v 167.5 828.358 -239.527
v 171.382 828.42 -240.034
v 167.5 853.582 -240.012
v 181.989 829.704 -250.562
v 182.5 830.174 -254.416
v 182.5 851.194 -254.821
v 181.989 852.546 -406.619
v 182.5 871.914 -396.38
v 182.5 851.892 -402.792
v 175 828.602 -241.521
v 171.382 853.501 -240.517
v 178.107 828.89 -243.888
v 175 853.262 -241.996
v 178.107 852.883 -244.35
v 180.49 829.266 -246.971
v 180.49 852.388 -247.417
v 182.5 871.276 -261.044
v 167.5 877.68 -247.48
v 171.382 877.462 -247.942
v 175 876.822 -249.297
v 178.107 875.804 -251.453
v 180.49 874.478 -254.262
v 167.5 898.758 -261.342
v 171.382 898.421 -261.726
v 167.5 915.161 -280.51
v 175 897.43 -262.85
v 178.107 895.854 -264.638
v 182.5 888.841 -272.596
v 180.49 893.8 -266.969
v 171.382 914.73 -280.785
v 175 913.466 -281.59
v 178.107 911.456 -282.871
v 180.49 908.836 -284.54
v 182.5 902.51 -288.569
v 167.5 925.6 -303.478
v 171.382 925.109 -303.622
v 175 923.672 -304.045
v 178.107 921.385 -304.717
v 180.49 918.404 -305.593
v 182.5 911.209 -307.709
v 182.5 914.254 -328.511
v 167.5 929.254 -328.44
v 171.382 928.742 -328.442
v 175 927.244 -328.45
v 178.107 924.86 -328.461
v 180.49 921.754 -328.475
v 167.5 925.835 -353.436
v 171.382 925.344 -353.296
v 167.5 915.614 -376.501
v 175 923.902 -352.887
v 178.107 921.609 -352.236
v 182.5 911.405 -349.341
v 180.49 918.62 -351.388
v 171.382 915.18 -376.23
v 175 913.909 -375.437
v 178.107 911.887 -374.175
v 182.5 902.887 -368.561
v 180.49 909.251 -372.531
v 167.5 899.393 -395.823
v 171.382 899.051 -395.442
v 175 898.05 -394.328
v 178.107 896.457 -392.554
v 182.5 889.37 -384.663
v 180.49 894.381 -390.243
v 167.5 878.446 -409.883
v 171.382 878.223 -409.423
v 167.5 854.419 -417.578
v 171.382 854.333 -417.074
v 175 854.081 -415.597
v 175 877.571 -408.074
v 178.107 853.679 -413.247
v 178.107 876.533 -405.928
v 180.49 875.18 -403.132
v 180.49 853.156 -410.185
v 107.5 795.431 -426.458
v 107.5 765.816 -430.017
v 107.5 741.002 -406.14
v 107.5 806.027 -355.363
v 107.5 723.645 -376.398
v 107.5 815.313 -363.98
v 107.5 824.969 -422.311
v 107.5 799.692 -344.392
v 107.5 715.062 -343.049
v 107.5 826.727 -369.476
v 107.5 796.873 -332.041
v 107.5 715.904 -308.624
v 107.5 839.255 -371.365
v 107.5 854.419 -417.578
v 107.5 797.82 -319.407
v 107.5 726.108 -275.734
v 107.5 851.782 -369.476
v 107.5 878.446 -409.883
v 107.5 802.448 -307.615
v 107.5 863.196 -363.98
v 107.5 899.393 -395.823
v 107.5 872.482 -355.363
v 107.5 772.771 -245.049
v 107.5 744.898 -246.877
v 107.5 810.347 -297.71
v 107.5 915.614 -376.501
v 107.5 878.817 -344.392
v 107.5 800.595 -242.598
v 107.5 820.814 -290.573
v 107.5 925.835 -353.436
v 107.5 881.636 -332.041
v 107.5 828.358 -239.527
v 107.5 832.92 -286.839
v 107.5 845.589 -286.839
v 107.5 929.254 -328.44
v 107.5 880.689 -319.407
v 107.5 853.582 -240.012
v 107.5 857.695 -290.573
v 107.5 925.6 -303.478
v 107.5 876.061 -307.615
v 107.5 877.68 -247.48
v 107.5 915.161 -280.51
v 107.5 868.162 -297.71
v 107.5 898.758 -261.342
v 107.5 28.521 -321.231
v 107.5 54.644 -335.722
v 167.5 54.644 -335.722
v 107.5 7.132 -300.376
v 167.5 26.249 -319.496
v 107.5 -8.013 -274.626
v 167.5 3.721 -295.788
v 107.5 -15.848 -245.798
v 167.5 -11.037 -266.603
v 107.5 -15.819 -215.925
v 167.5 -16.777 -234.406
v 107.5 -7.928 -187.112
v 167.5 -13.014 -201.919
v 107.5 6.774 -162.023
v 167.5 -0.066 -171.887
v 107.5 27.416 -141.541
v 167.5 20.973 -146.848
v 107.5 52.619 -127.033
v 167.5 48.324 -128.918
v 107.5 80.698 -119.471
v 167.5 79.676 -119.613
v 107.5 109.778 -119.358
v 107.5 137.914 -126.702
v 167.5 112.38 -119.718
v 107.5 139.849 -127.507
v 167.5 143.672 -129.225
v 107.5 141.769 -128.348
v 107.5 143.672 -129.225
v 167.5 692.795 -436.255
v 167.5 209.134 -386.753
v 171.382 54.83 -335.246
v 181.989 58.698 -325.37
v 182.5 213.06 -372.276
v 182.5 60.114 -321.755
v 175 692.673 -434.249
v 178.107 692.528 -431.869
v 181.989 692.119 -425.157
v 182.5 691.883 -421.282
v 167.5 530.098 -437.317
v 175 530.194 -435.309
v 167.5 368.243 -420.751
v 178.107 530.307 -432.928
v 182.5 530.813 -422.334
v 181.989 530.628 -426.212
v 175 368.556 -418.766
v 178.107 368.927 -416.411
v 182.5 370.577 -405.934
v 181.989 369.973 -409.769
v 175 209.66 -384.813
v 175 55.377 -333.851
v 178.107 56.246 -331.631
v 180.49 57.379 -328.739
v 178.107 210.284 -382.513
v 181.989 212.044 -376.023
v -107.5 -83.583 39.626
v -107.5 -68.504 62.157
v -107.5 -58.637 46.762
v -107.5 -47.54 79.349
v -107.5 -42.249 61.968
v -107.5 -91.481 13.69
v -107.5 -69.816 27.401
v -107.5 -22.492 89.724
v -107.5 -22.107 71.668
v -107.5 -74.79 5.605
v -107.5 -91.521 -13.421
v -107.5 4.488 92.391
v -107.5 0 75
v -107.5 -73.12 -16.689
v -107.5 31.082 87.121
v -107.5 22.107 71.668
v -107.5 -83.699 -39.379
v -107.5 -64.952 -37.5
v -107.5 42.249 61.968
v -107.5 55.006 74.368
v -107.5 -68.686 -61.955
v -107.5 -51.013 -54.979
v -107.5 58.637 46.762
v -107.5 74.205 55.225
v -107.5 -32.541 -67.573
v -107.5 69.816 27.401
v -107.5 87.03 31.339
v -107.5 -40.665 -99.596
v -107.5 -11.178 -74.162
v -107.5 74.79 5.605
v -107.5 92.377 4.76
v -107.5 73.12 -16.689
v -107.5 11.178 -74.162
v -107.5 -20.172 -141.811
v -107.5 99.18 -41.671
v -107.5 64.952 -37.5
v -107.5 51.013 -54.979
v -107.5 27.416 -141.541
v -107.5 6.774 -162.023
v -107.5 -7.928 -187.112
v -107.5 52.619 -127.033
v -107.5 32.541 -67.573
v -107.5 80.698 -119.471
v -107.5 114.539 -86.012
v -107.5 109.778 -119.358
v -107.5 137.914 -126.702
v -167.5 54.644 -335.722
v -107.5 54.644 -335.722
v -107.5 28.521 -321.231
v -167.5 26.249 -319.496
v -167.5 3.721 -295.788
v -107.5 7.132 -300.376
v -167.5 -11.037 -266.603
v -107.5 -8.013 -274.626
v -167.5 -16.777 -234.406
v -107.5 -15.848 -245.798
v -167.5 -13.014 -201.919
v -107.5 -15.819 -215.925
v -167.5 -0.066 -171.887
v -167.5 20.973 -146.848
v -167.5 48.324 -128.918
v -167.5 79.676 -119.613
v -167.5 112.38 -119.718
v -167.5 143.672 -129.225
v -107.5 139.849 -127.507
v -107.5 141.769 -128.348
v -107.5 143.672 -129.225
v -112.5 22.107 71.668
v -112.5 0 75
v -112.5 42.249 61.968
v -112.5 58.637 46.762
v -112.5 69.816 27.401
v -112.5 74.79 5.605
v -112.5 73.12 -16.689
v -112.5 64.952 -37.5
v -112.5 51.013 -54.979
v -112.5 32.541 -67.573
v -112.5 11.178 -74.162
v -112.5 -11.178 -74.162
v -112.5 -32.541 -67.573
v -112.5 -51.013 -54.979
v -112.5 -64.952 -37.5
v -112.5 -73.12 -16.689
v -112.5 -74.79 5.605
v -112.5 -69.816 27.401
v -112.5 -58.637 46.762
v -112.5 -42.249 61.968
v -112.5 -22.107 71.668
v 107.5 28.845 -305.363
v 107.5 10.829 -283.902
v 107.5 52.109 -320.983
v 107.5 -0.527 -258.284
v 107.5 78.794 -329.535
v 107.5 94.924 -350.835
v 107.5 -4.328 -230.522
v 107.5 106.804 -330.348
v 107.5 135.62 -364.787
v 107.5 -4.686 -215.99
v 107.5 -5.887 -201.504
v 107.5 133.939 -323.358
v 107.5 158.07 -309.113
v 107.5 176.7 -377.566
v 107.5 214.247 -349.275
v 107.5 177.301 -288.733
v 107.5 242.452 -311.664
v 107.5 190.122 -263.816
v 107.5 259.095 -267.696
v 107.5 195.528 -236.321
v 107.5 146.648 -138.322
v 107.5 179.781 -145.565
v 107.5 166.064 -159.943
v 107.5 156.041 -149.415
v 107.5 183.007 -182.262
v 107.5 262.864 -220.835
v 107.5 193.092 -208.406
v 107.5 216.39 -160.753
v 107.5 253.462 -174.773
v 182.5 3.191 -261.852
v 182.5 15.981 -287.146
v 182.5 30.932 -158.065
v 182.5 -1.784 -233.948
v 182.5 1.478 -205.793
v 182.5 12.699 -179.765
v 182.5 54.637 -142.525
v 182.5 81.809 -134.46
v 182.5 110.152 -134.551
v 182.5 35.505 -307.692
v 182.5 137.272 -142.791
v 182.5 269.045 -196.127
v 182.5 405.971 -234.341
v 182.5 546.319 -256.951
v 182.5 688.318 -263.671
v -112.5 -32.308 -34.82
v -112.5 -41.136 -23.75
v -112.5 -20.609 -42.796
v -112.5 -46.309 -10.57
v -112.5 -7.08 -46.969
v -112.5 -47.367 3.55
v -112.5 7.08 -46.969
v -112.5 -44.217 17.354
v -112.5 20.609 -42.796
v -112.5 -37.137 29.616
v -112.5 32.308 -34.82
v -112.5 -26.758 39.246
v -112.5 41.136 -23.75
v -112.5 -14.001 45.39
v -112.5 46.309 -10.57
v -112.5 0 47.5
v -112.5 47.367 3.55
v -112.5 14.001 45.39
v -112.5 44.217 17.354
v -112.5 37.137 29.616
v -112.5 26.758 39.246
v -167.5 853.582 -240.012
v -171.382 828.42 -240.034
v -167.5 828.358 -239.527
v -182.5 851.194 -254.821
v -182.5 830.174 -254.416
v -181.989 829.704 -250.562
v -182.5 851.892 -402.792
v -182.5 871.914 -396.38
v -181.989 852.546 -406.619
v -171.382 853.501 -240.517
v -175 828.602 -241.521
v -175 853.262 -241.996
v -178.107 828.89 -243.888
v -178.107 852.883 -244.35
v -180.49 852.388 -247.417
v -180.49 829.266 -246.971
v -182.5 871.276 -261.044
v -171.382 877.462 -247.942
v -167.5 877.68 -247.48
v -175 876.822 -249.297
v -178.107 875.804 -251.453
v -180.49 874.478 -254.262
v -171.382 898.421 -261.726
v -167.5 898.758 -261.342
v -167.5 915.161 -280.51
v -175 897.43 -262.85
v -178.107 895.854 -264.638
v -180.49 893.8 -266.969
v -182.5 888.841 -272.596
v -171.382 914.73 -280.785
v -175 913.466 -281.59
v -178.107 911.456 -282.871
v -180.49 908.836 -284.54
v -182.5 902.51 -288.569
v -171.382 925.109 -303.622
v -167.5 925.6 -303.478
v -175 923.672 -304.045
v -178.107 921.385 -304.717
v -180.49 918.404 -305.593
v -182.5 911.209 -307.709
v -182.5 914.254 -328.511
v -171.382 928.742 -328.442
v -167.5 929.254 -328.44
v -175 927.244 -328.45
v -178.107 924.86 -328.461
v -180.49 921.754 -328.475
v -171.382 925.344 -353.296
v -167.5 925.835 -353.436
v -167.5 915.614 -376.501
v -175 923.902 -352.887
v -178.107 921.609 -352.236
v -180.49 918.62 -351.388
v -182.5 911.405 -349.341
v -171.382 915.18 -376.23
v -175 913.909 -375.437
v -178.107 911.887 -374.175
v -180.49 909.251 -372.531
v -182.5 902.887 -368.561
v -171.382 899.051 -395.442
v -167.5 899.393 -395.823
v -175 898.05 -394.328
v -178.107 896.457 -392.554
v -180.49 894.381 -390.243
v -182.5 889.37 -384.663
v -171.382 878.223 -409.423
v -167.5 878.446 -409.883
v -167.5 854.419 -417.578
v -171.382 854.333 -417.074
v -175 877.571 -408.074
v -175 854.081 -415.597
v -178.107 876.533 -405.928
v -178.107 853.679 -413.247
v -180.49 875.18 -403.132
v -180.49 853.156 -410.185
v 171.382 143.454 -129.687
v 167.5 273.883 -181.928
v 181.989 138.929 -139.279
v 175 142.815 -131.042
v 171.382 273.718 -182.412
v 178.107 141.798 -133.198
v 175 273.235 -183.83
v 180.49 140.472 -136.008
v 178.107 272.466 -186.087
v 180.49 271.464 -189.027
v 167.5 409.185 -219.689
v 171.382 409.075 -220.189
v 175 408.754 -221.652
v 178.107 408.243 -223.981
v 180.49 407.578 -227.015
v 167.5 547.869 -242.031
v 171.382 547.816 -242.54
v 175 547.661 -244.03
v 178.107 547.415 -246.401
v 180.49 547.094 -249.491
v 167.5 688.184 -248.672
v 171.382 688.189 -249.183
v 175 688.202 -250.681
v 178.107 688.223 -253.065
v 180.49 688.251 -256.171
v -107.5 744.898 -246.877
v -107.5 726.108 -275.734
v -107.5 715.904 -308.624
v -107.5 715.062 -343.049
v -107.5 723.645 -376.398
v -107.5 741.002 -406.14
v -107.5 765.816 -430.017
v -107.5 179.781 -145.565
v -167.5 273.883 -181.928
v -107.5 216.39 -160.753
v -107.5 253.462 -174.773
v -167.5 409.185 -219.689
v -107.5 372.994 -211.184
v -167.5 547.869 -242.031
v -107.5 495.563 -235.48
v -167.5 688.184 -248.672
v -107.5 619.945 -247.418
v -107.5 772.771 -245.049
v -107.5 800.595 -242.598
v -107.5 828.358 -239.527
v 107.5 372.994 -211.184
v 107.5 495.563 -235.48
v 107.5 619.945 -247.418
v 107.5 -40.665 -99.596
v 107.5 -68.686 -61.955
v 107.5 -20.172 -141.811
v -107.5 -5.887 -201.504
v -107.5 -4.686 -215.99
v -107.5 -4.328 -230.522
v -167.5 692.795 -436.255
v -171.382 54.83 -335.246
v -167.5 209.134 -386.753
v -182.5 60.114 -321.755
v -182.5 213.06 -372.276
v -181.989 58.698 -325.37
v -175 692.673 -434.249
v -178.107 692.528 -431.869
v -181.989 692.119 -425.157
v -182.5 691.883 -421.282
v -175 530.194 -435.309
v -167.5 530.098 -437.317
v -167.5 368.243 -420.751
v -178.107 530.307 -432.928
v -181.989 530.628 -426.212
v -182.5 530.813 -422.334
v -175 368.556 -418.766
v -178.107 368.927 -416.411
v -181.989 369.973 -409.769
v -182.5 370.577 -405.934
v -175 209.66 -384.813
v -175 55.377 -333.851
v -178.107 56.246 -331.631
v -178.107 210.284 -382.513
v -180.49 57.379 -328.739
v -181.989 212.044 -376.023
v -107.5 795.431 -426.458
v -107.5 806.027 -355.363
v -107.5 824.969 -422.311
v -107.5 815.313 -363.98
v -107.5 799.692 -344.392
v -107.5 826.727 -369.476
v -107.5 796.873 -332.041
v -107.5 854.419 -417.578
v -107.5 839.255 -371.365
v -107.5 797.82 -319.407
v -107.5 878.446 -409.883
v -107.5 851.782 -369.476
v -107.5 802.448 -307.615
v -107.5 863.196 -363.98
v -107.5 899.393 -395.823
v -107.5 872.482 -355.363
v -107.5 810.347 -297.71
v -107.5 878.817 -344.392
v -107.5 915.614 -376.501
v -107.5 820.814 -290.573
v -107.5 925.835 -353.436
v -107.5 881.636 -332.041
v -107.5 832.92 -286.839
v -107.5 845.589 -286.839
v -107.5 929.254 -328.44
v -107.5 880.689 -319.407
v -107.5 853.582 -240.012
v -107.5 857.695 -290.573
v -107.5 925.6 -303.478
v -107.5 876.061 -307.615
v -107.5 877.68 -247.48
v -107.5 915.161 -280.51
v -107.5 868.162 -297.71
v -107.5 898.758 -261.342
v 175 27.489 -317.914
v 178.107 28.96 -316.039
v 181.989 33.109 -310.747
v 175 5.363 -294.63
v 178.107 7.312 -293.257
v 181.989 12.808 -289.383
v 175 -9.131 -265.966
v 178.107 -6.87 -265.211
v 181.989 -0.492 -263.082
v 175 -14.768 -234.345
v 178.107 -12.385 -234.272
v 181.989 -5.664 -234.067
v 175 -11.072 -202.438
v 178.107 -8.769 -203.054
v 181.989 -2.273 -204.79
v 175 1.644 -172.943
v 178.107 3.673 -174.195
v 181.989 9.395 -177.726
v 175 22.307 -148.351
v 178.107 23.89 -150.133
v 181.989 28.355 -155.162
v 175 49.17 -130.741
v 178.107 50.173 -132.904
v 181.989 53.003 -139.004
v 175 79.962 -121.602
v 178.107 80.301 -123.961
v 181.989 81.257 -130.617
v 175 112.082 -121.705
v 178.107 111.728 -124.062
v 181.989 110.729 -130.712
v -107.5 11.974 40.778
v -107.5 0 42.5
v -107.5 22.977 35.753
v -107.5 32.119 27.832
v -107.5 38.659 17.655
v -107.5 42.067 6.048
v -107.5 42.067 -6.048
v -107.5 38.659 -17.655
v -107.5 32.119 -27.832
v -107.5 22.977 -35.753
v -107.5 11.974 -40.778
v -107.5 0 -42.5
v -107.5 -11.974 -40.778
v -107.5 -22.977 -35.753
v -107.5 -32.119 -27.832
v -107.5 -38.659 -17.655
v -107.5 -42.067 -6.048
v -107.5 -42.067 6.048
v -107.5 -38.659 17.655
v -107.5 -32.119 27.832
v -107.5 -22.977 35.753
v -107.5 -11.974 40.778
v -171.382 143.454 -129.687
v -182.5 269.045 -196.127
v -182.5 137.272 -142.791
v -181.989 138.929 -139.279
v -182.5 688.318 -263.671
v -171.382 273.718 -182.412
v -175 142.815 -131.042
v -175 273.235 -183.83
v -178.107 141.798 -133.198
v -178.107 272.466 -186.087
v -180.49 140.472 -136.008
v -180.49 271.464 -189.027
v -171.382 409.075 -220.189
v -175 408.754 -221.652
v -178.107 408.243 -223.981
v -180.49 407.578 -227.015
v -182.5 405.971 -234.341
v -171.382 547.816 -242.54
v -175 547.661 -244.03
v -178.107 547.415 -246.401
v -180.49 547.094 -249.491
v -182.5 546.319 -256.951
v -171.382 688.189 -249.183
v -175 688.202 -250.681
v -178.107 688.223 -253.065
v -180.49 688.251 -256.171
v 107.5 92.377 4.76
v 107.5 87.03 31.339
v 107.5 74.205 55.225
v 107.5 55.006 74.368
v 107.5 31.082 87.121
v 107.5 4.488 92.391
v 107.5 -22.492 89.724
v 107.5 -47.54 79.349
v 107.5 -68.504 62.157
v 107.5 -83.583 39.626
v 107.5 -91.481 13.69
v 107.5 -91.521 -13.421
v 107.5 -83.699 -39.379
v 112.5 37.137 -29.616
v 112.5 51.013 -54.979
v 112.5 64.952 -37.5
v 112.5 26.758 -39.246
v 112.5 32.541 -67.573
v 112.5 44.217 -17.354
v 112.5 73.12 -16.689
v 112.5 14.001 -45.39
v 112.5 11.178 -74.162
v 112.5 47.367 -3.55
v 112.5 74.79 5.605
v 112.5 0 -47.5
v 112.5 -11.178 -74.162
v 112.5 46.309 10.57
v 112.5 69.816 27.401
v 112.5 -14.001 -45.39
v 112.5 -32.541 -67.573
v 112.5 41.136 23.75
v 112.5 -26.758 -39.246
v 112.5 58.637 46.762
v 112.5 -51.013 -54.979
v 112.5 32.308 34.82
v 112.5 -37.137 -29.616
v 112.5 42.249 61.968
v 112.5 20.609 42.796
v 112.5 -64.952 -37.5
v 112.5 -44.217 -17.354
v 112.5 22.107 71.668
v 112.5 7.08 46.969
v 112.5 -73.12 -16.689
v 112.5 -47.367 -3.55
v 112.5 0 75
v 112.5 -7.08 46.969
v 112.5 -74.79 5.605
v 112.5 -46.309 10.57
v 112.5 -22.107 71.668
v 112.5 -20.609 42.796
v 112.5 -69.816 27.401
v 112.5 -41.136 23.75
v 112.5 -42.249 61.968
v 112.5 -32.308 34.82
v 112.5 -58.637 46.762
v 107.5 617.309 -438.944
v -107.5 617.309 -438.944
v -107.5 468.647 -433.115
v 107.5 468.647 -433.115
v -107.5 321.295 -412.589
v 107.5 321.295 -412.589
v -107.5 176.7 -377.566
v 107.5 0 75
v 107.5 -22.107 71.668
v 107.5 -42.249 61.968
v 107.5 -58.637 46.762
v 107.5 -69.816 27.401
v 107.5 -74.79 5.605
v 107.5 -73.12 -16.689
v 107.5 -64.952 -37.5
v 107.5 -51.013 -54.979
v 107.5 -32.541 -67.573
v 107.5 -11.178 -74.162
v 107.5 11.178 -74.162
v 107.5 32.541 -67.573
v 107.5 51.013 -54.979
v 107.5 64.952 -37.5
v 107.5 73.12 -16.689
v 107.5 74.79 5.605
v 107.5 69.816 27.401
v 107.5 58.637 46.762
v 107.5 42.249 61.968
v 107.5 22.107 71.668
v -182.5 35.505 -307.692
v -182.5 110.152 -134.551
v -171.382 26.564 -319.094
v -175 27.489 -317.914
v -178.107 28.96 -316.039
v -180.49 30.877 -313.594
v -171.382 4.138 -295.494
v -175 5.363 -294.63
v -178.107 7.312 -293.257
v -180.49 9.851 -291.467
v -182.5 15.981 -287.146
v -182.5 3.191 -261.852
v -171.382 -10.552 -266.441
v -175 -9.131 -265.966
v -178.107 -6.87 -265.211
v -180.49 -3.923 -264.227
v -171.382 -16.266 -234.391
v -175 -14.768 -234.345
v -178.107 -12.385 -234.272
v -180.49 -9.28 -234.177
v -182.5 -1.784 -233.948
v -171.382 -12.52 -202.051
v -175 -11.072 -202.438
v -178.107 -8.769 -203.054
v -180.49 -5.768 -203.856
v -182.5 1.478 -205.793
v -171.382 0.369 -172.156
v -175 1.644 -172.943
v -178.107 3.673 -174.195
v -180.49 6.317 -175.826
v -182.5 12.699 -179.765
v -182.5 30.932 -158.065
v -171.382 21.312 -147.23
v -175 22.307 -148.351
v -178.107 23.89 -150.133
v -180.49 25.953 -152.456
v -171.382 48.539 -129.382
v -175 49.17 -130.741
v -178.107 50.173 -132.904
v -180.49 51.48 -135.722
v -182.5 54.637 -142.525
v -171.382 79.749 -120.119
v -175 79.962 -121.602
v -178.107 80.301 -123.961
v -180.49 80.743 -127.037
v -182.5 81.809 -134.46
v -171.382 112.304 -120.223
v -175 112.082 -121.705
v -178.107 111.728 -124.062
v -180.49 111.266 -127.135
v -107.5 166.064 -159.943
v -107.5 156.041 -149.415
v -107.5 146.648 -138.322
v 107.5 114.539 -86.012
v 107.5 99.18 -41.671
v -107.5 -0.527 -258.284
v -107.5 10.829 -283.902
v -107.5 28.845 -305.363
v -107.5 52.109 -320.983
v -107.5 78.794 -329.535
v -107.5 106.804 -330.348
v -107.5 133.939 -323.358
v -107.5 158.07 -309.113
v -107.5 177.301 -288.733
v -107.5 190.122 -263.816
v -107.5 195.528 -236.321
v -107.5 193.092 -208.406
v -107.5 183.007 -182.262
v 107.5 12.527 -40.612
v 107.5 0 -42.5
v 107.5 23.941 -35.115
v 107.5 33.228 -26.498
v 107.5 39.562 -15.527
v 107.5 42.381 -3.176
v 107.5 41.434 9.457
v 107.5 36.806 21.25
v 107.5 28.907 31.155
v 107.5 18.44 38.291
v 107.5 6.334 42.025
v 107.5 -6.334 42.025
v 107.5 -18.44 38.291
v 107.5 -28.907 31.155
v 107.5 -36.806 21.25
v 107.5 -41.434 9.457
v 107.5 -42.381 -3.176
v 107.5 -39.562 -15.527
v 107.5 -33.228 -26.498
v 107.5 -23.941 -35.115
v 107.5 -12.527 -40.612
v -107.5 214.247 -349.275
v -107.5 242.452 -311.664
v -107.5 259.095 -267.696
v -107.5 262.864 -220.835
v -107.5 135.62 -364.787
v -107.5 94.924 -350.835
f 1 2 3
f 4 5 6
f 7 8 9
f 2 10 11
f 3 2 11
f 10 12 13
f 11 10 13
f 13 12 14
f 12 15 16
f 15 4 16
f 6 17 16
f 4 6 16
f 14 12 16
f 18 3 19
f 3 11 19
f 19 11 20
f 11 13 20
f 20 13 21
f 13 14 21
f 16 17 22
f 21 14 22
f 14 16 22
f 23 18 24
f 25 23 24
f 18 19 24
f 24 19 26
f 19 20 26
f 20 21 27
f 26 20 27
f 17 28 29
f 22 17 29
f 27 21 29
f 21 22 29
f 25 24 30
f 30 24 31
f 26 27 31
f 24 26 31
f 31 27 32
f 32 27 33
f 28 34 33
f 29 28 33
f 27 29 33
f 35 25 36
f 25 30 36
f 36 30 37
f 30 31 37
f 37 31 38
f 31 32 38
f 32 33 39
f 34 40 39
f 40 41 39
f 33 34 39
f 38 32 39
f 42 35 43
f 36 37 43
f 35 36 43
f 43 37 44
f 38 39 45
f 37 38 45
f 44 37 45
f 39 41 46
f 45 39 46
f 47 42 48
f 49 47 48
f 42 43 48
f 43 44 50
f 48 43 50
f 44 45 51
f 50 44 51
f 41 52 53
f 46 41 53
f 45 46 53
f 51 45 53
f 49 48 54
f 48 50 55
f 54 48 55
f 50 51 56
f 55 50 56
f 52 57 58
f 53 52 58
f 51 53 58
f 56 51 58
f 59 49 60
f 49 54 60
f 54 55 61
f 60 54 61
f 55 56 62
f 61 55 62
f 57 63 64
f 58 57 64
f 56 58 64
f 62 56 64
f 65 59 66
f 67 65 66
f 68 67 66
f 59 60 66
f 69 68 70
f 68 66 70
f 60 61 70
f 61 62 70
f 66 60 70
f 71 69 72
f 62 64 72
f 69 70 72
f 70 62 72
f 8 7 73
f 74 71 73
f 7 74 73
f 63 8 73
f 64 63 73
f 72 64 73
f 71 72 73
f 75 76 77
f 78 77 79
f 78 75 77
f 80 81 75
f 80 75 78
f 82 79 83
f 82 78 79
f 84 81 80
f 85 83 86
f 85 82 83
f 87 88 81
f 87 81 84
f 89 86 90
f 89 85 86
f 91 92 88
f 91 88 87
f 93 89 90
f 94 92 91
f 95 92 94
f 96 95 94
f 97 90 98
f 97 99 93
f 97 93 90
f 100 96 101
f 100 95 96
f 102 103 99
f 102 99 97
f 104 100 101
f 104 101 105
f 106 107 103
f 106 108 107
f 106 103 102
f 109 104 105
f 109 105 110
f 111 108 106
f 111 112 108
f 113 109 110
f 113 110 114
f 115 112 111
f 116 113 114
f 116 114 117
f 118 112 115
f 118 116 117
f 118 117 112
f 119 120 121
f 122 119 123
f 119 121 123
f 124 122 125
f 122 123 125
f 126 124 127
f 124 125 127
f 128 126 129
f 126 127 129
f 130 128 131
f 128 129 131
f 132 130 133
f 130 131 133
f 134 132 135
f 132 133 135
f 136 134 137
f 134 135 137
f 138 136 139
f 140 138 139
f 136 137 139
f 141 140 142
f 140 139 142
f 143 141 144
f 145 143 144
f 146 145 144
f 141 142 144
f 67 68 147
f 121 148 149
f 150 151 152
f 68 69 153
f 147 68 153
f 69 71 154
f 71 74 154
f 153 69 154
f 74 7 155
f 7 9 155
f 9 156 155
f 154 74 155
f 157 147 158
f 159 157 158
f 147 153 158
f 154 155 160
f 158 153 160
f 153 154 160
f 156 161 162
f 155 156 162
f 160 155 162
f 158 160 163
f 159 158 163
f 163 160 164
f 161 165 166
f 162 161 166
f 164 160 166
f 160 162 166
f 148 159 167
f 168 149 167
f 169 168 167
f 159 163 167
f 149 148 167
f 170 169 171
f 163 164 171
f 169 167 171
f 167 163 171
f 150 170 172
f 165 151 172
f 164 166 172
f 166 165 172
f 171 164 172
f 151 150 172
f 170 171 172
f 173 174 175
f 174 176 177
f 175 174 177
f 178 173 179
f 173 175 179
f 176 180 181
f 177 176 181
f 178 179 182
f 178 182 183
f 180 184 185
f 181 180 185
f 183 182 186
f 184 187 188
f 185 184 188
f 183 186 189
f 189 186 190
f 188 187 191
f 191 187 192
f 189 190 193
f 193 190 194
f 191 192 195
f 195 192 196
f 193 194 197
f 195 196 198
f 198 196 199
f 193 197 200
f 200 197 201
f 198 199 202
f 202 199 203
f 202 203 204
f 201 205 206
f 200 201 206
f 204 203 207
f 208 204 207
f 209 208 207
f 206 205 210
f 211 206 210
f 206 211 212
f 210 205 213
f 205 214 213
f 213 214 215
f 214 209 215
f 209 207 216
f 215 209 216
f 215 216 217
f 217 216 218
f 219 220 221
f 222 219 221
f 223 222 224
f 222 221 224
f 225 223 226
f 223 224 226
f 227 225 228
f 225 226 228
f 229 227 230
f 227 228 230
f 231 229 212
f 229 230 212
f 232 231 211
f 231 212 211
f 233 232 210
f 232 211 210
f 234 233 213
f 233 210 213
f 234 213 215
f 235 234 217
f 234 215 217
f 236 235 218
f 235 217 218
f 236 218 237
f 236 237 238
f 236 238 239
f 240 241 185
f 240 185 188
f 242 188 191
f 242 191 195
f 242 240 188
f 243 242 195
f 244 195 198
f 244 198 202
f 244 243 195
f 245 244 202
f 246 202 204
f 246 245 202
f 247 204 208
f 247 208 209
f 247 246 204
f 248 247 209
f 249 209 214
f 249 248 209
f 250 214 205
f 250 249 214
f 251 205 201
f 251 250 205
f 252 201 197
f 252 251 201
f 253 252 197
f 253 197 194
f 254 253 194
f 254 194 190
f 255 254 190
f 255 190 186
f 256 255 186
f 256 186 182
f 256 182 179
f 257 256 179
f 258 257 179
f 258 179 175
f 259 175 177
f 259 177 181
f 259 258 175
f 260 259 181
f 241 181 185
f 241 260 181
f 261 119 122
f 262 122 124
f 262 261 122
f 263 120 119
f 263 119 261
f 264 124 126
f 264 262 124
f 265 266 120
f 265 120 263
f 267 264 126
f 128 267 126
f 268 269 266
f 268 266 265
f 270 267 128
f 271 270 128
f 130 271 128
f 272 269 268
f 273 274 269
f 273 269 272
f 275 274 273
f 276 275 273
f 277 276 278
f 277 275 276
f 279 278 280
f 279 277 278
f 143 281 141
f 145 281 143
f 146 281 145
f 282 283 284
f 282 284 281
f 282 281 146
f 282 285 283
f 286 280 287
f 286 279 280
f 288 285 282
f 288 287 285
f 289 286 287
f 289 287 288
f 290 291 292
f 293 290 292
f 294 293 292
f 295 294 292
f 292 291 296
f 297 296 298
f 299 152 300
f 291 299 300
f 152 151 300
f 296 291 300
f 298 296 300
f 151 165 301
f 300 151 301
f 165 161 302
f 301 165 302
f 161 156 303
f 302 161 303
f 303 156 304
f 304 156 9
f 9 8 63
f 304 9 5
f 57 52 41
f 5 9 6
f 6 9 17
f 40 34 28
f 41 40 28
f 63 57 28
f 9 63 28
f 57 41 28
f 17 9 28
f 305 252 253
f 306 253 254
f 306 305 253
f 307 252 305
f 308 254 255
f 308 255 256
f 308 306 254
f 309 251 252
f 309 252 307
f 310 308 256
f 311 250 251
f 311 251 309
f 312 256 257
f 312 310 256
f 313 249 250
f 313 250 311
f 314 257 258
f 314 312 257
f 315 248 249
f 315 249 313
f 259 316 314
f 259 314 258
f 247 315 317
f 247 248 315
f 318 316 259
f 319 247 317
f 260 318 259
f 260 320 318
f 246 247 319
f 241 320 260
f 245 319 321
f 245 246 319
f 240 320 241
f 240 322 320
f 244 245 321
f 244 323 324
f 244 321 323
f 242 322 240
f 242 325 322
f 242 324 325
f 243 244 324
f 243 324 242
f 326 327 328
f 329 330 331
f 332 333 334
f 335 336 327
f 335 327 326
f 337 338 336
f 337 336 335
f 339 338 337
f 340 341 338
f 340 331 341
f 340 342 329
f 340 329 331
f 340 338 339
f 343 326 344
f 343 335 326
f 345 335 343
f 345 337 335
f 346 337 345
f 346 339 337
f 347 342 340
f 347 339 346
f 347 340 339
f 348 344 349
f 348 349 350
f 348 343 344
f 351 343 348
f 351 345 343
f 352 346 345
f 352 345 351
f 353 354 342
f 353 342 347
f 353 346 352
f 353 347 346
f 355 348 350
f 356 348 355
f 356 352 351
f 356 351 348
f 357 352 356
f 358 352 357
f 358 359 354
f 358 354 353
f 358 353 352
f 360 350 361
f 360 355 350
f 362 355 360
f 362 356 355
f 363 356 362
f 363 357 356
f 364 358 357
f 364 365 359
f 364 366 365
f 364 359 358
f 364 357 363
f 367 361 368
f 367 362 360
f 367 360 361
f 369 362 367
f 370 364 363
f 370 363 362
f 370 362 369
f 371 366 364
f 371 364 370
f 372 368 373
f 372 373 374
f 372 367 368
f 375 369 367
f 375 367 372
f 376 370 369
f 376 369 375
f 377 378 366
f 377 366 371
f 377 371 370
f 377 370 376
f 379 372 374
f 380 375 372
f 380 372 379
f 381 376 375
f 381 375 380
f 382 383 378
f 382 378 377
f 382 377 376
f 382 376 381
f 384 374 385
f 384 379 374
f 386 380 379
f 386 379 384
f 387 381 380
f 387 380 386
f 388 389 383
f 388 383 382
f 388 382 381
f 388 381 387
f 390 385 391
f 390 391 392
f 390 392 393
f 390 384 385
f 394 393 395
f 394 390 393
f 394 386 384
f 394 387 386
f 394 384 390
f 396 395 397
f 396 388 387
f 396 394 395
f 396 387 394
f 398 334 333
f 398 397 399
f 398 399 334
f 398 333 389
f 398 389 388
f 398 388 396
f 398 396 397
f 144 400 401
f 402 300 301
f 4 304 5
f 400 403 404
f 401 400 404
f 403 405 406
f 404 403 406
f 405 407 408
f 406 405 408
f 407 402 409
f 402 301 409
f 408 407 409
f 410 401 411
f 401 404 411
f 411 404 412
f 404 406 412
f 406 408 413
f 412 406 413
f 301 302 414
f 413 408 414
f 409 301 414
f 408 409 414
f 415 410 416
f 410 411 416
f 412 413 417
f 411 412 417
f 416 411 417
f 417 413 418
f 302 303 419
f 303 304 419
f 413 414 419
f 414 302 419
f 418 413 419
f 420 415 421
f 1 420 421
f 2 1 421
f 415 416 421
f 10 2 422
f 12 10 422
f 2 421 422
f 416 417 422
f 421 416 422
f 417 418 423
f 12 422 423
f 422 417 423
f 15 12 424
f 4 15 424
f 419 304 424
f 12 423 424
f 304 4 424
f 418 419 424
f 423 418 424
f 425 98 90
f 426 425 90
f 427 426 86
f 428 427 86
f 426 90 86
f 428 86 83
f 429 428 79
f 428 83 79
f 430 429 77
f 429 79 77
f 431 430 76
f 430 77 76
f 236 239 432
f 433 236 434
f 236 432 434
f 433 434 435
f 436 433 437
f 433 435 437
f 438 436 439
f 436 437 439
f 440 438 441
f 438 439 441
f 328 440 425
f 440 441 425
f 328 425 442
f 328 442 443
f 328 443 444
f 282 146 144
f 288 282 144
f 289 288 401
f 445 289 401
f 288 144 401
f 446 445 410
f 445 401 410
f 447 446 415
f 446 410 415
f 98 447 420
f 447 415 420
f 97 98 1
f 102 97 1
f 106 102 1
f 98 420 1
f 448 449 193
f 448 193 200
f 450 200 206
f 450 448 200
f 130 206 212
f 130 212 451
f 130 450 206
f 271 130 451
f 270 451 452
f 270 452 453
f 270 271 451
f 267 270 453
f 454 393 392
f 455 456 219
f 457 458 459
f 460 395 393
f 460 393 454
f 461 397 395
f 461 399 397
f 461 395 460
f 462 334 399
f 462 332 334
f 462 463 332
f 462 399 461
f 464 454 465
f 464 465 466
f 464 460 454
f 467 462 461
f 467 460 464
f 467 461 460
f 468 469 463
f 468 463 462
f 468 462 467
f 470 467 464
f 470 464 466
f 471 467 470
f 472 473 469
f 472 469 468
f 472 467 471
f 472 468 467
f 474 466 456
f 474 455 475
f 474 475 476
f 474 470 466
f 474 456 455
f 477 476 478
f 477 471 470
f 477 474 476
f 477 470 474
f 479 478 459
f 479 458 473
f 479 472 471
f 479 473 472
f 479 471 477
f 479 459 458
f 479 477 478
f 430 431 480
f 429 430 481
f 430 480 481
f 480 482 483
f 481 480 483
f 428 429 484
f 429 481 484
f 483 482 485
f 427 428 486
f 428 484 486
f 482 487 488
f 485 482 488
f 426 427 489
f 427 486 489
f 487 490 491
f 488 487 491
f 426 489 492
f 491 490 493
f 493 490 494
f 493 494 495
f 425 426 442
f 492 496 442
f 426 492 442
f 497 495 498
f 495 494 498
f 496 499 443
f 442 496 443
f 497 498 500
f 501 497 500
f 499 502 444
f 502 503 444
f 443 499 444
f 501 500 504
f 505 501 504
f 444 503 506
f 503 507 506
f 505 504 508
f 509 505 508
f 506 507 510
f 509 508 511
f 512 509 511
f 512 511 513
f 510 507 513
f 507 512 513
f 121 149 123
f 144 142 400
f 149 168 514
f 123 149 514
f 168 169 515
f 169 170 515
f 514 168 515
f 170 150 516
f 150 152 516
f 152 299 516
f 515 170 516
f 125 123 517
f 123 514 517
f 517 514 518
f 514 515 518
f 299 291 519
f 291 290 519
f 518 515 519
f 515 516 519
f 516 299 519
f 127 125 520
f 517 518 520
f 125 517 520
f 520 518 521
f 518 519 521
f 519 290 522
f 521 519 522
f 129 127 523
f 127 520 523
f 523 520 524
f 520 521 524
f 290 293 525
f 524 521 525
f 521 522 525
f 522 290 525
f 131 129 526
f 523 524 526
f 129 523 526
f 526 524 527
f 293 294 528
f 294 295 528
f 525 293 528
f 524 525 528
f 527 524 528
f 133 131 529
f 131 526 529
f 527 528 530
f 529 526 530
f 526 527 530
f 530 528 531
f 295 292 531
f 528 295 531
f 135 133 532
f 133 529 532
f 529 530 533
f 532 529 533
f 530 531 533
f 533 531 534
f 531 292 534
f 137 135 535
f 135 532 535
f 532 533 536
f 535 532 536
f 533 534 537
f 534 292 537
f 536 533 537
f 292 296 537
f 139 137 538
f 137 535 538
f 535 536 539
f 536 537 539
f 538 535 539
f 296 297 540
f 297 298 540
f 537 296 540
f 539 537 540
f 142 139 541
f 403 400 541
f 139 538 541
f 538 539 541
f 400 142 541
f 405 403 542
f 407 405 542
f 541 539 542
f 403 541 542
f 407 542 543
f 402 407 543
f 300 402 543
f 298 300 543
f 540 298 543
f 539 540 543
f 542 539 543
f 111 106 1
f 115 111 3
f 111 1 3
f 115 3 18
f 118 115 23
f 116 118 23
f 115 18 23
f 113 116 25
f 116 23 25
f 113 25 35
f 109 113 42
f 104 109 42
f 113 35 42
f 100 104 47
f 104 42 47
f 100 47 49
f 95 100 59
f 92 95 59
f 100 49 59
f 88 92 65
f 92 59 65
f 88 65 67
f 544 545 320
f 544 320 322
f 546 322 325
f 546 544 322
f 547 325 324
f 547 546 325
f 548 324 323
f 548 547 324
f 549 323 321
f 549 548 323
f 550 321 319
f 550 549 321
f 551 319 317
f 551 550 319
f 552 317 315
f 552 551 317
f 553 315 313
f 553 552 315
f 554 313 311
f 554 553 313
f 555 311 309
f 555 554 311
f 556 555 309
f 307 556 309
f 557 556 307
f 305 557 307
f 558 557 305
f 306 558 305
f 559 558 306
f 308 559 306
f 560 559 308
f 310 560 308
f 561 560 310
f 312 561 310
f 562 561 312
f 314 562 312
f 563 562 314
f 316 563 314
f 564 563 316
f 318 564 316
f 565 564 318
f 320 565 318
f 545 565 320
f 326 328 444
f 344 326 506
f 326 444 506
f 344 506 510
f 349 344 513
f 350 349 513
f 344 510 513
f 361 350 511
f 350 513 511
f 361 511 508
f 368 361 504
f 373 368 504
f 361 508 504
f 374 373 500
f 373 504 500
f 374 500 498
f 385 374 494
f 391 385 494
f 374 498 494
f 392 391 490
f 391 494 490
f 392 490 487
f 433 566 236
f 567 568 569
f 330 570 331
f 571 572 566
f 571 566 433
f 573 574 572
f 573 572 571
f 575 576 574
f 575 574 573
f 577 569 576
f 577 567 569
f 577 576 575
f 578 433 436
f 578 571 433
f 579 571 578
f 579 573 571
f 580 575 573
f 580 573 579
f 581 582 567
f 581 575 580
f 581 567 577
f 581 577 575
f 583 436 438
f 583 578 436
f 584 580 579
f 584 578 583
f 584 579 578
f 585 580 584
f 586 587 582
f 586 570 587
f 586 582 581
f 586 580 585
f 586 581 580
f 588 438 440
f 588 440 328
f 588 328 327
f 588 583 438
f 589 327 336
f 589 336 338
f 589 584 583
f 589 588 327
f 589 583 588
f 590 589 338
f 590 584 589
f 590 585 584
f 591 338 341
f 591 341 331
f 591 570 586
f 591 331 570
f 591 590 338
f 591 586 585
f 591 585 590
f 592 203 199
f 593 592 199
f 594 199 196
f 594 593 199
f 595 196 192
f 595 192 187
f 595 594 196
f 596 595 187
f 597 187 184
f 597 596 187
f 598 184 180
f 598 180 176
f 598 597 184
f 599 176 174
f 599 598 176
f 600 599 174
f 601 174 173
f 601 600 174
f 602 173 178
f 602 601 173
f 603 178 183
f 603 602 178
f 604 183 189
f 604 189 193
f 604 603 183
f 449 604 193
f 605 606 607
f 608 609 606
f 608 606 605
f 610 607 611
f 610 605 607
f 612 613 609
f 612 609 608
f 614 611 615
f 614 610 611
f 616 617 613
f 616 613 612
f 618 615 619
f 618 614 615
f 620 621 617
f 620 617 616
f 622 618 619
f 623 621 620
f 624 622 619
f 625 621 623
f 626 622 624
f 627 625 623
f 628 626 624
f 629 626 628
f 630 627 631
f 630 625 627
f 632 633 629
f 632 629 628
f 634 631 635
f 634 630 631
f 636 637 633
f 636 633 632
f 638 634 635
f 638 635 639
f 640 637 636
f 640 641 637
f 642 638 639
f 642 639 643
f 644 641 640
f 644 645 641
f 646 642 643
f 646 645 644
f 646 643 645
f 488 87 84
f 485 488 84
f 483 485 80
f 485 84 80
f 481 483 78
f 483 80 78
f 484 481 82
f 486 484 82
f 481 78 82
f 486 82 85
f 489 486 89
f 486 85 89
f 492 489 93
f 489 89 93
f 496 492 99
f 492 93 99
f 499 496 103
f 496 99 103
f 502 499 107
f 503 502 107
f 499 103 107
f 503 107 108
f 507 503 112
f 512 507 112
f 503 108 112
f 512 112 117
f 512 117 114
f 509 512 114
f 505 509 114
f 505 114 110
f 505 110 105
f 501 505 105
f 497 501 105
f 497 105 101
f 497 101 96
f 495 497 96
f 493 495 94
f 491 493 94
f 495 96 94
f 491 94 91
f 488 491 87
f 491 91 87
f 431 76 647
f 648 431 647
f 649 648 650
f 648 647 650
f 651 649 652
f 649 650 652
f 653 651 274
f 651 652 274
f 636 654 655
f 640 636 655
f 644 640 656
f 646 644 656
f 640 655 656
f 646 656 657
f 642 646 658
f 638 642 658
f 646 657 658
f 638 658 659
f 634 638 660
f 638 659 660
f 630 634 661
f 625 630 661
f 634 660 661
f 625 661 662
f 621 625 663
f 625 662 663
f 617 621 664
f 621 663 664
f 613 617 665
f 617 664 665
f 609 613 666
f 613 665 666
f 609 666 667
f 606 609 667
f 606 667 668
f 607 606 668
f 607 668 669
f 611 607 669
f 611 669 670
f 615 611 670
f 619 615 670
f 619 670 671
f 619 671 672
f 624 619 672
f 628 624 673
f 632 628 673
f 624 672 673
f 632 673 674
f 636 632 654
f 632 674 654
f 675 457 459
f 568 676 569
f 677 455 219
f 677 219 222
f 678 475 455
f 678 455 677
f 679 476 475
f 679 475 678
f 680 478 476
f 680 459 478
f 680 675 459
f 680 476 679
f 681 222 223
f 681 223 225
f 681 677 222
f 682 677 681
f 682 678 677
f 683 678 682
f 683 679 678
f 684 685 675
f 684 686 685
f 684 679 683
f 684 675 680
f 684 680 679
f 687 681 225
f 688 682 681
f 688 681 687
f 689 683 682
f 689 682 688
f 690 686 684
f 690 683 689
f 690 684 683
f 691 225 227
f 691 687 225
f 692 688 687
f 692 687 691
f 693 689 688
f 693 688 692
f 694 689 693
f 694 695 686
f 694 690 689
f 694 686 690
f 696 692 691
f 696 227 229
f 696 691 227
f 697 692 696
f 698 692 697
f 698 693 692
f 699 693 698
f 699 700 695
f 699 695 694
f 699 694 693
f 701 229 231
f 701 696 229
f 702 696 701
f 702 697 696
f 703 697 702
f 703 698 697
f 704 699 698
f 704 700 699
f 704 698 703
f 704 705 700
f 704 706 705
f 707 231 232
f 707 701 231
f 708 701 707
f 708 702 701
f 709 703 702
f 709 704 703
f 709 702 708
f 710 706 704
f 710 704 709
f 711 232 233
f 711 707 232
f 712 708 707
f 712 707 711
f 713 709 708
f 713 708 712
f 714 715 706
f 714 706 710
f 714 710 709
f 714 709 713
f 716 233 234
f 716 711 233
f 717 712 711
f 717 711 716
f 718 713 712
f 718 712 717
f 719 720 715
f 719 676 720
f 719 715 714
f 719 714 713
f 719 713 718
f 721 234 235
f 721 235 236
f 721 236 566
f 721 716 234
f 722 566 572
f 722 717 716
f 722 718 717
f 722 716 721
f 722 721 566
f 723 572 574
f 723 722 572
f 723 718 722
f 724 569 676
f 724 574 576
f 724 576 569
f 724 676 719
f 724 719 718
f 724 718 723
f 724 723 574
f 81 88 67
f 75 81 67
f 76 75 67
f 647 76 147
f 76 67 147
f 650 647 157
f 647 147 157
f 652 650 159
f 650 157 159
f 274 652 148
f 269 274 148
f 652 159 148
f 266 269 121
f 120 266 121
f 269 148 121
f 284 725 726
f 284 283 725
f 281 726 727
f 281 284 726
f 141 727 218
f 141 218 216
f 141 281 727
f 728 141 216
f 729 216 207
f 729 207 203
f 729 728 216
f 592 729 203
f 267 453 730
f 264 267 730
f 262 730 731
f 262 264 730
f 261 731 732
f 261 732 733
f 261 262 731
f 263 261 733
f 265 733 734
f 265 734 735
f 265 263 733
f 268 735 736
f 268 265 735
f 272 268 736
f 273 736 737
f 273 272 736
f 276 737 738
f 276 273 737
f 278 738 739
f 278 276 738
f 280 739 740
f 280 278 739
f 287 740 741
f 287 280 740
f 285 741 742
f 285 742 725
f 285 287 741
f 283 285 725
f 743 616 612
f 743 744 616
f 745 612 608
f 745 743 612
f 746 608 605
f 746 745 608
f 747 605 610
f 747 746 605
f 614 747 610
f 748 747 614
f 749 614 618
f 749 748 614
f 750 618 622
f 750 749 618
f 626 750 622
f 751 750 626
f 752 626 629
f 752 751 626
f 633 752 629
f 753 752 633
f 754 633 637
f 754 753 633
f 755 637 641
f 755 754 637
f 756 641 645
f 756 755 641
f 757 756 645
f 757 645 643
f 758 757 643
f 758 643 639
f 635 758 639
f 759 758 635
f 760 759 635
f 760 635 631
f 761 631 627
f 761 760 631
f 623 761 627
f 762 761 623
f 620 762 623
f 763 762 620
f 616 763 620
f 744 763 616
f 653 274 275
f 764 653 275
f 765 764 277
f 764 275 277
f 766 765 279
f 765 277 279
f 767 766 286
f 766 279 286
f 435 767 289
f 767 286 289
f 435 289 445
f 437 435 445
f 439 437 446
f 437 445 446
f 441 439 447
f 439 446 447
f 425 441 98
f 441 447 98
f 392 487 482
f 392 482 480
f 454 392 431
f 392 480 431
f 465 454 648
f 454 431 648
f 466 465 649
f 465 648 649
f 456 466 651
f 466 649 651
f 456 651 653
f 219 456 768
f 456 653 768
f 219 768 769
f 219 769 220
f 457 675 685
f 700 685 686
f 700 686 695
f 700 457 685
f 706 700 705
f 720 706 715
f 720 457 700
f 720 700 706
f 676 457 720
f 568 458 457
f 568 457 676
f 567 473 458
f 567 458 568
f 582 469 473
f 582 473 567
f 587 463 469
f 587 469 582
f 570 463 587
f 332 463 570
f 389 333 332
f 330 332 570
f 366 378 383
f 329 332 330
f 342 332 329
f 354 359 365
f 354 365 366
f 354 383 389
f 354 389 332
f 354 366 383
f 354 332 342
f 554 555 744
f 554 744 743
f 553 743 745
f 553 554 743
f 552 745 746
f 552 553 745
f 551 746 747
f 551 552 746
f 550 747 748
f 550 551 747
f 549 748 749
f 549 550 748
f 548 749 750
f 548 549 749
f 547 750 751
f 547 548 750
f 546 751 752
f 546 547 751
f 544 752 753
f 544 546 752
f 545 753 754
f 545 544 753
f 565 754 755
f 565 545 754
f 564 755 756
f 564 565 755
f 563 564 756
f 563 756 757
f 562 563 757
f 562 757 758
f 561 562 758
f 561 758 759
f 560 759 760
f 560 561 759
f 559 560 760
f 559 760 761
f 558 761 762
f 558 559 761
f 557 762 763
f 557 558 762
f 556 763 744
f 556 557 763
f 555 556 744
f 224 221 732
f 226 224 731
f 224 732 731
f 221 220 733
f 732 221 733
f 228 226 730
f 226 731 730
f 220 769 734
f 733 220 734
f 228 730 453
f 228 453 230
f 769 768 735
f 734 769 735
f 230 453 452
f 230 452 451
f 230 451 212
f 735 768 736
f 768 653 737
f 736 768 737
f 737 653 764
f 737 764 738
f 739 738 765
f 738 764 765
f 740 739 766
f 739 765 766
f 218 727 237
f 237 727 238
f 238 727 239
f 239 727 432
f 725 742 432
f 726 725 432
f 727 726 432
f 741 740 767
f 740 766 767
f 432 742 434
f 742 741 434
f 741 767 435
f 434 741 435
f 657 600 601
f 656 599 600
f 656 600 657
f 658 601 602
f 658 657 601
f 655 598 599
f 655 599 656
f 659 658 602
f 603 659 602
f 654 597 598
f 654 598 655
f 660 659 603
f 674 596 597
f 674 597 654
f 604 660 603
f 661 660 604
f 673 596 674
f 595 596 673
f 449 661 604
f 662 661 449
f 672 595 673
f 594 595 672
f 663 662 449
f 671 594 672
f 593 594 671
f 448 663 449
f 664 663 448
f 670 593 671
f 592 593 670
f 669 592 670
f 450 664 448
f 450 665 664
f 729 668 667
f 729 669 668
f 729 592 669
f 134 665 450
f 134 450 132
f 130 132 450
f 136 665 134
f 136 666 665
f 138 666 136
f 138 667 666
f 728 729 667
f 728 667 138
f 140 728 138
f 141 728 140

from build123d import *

# Parameters (mm, degrees)
SKETCH1_R           = 42.5
BOSS_EXTRUDE1_DEPTH = 107.5
SKETCH2_R           = 75
SKETCH2_R_2         = 42.5
BOSS_EXTRUDE2_DEPTH = 5
BOSS_EXTRUDE3_START = 5
SKETCH3_R           = 75
SKETCH3_R_2         = 42.5
BOSS_EXTRUDE3_DEPTH = 5
CHAMFER1_SIZE       = 5
BOSS_EXTRUDE4_DEPTH = 75
BOSS_EXTRUDE5_START = 75
BOSS_EXTRUDE5_DEPTH = 75
FILLET2_R           = 15
SKETCH7_R           = 42.5
BOSS_EXTRUDE6_DEPTH = 215


with BuildPart() as part:
    # Sketch1 → Boss-Extrude1 (new, symmetric)
    with BuildSketch(Plane(origin=(0, 0, 0), x_dir=(0, 0, -1), z_dir=(1, 0, 0))):
        with BuildLine():
            ThreePointArc((-4.759905033, 92.377450193), (-85.458856757, -35.398217494), (61.954960333, -68.686482587))
            ThreePointArc((61.954960333, -68.686482587), (140.229582164, -20.76943431), (230.521573397, -4.328136996))
            ThreePointArc((230.521573397, -4.328136996), (323.357836379, 133.939201328), (159.94291274, 166.063822779))
            ThreePointArc((159.94291274, 166.063822779), (84.471080629, 113.843496313), (-4.759905033, 92.377450193))
        make_face()
        Circle(SKETCH1_R, mode=Mode.SUBTRACT)
    extrude(amount=BOSS_EXTRUDE1_DEPTH, both=True)

    # Sketch2 → Boss-Extrude2 (add)
    with BuildSketch(Plane(origin=(107.5, 0, 0), x_dir=(0, 0, -1), z_dir=(1, 0, 0))):
        with Locations(Location((0, 0, 0), (0, 0, 180))):
            Circle(SKETCH2_R)
        Circle(SKETCH2_R_2, mode=Mode.SUBTRACT)
    extrude(amount=BOSS_EXTRUDE2_DEPTH)

    # Sketch3 → Boss-Extrude3 (add)
    with BuildSketch(Plane.ZY.offset(107.5).offset(BOSS_EXTRUDE3_START)):
        Circle(SKETCH3_R)
        Circle(SKETCH3_R_2, mode=Mode.SUBTRACT)
    extrude(amount=-BOSS_EXTRUDE3_DEPTH)

    # Chamfer1
    # the kernel refuses this chamfer: 5 mm, written as the material it takes off along each edge
    with BuildSketch(Plane(origin=(112.5, 0, 0), x_dir=(0, 0, -1), z_dir=(0, -1, 0))) as chamfer1_piece_1:
        Polygon((42.5 + CHAMFER1_SIZE, 0), (42.5, -CHAMFER1_SIZE), (42.5, 0), align=None)
    revolve(axis=Axis((112.5, 0, 0), (1, 0, 0)), mode=Mode.SUBTRACT)
    with BuildSketch(Plane(origin=(-112.5, 0, 0), x_dir=(0, 0, 1), z_dir=(0, -1, 0))) as chamfer1_piece_2:
        Polygon((42.5 + CHAMFER1_SIZE, 0), (42.5, -CHAMFER1_SIZE), (42.5, 0), align=None)
    revolve(axis=Axis((-112.5, 0, 0), (-1, 0, 0)), mode=Mode.SUBTRACT)

    # Sketch5 → Boss-Extrude4 (add)
    with BuildSketch(Plane.ZY.offset(107.5)):
        with BuildLine():
            ThreePointArc((-335.722160279, 54.643910463), (-186.43026552, -7.636801177), (-129.224593262, 143.672378798))
            ThreePointArc((-129.224593262, 143.672378798), (-232.809942482, 478.212645548), (-239.526554212, 828.358332052))
            ThreePointArc((-239.526554212, 828.358332052), (-315.830208714, 928.305649758), (-417.57768021, 854.419480204))
            ThreePointArc((-417.57768021, 854.419480204), (-431.229967878, 448.945530482), (-335.722160279, 54.643910463))
        make_face()
    extrude(amount=BOSS_EXTRUDE4_DEPTH)

    # Sketch6 → Boss-Extrude5 (add)
    with BuildSketch(Plane(origin=(107.5, 0, 0), x_dir=(0, 0, -1), z_dir=(1, 0, 0)).offset(BOSS_EXTRUDE5_START)):
        with BuildLine():
            ThreePointArc((129.224593262, 143.672378798), (232.809942482, 478.212645548), (239.526554212, 828.358332052))
            ThreePointArc((239.526554212, 828.358332052), (315.830208714, 928.305649758), (417.57768021, 854.419480204))
            ThreePointArc((417.57768021, 854.419480204), (431.229967878, 448.945530482), (335.722160279, 54.643910463))
            ThreePointArc((335.722160279, 54.643910463), (186.43026552, -7.636801177), (129.224593262, 143.672378798))
        make_face()
    extrude(amount=-BOSS_EXTRUDE5_DEPTH)

    # Fillet2
    fillet2_edges = [part.edges().sort_by_distance(p)[0] for p in [
        (-182.5, 478.212645548, -232.809942482),
        (-182.5, 928.305649758, -315.830208714),
        (-182.5, 448.945530482, -431.229967878),
        (-182.5, -7.636801177, -186.43026552),
        (182.5, -7.636801177, -186.43026552),
        (182.5, 448.945530482, -431.229967878),
        (182.5, 928.305649758, -315.830208714),
        (182.5, 478.212645548, -232.809942482),
    ]]
    fillet(fillet2_edges, radius=FILLET2_R)

    # Sketch7 → Boss-Extrude6 (add)
    with BuildSketch(Plane.ZY.offset(-107.5)):
        with Locations(Location((-328.864527293, 839.254504122, 0), (0, 0, 180))):
            Circle(SKETCH7_R)
        with BuildLine():
            ThreePointArc((-430.016772116, 765.815935458), (-433.115150694, 468.647268594), (-377.566301605, 176.700112622))
            ThreePointArc((-377.566301605, 176.700112622), (-290.266675416, 252.323787921), (-174.772654288, 253.462244012))
            ThreePointArc((-174.772654288, 253.462244012), (-235.480184212, 495.562856506), (-246.877162179, 744.898412841))
            ThreePointArc((-246.877162179, 744.898412841), (-343.049337537, 715.061947347), (-430.016772116, 765.815935458))
        make_face()
    extrude(amount=BOSS_EXTRUDE6_DEPTH)


solid = part.part
